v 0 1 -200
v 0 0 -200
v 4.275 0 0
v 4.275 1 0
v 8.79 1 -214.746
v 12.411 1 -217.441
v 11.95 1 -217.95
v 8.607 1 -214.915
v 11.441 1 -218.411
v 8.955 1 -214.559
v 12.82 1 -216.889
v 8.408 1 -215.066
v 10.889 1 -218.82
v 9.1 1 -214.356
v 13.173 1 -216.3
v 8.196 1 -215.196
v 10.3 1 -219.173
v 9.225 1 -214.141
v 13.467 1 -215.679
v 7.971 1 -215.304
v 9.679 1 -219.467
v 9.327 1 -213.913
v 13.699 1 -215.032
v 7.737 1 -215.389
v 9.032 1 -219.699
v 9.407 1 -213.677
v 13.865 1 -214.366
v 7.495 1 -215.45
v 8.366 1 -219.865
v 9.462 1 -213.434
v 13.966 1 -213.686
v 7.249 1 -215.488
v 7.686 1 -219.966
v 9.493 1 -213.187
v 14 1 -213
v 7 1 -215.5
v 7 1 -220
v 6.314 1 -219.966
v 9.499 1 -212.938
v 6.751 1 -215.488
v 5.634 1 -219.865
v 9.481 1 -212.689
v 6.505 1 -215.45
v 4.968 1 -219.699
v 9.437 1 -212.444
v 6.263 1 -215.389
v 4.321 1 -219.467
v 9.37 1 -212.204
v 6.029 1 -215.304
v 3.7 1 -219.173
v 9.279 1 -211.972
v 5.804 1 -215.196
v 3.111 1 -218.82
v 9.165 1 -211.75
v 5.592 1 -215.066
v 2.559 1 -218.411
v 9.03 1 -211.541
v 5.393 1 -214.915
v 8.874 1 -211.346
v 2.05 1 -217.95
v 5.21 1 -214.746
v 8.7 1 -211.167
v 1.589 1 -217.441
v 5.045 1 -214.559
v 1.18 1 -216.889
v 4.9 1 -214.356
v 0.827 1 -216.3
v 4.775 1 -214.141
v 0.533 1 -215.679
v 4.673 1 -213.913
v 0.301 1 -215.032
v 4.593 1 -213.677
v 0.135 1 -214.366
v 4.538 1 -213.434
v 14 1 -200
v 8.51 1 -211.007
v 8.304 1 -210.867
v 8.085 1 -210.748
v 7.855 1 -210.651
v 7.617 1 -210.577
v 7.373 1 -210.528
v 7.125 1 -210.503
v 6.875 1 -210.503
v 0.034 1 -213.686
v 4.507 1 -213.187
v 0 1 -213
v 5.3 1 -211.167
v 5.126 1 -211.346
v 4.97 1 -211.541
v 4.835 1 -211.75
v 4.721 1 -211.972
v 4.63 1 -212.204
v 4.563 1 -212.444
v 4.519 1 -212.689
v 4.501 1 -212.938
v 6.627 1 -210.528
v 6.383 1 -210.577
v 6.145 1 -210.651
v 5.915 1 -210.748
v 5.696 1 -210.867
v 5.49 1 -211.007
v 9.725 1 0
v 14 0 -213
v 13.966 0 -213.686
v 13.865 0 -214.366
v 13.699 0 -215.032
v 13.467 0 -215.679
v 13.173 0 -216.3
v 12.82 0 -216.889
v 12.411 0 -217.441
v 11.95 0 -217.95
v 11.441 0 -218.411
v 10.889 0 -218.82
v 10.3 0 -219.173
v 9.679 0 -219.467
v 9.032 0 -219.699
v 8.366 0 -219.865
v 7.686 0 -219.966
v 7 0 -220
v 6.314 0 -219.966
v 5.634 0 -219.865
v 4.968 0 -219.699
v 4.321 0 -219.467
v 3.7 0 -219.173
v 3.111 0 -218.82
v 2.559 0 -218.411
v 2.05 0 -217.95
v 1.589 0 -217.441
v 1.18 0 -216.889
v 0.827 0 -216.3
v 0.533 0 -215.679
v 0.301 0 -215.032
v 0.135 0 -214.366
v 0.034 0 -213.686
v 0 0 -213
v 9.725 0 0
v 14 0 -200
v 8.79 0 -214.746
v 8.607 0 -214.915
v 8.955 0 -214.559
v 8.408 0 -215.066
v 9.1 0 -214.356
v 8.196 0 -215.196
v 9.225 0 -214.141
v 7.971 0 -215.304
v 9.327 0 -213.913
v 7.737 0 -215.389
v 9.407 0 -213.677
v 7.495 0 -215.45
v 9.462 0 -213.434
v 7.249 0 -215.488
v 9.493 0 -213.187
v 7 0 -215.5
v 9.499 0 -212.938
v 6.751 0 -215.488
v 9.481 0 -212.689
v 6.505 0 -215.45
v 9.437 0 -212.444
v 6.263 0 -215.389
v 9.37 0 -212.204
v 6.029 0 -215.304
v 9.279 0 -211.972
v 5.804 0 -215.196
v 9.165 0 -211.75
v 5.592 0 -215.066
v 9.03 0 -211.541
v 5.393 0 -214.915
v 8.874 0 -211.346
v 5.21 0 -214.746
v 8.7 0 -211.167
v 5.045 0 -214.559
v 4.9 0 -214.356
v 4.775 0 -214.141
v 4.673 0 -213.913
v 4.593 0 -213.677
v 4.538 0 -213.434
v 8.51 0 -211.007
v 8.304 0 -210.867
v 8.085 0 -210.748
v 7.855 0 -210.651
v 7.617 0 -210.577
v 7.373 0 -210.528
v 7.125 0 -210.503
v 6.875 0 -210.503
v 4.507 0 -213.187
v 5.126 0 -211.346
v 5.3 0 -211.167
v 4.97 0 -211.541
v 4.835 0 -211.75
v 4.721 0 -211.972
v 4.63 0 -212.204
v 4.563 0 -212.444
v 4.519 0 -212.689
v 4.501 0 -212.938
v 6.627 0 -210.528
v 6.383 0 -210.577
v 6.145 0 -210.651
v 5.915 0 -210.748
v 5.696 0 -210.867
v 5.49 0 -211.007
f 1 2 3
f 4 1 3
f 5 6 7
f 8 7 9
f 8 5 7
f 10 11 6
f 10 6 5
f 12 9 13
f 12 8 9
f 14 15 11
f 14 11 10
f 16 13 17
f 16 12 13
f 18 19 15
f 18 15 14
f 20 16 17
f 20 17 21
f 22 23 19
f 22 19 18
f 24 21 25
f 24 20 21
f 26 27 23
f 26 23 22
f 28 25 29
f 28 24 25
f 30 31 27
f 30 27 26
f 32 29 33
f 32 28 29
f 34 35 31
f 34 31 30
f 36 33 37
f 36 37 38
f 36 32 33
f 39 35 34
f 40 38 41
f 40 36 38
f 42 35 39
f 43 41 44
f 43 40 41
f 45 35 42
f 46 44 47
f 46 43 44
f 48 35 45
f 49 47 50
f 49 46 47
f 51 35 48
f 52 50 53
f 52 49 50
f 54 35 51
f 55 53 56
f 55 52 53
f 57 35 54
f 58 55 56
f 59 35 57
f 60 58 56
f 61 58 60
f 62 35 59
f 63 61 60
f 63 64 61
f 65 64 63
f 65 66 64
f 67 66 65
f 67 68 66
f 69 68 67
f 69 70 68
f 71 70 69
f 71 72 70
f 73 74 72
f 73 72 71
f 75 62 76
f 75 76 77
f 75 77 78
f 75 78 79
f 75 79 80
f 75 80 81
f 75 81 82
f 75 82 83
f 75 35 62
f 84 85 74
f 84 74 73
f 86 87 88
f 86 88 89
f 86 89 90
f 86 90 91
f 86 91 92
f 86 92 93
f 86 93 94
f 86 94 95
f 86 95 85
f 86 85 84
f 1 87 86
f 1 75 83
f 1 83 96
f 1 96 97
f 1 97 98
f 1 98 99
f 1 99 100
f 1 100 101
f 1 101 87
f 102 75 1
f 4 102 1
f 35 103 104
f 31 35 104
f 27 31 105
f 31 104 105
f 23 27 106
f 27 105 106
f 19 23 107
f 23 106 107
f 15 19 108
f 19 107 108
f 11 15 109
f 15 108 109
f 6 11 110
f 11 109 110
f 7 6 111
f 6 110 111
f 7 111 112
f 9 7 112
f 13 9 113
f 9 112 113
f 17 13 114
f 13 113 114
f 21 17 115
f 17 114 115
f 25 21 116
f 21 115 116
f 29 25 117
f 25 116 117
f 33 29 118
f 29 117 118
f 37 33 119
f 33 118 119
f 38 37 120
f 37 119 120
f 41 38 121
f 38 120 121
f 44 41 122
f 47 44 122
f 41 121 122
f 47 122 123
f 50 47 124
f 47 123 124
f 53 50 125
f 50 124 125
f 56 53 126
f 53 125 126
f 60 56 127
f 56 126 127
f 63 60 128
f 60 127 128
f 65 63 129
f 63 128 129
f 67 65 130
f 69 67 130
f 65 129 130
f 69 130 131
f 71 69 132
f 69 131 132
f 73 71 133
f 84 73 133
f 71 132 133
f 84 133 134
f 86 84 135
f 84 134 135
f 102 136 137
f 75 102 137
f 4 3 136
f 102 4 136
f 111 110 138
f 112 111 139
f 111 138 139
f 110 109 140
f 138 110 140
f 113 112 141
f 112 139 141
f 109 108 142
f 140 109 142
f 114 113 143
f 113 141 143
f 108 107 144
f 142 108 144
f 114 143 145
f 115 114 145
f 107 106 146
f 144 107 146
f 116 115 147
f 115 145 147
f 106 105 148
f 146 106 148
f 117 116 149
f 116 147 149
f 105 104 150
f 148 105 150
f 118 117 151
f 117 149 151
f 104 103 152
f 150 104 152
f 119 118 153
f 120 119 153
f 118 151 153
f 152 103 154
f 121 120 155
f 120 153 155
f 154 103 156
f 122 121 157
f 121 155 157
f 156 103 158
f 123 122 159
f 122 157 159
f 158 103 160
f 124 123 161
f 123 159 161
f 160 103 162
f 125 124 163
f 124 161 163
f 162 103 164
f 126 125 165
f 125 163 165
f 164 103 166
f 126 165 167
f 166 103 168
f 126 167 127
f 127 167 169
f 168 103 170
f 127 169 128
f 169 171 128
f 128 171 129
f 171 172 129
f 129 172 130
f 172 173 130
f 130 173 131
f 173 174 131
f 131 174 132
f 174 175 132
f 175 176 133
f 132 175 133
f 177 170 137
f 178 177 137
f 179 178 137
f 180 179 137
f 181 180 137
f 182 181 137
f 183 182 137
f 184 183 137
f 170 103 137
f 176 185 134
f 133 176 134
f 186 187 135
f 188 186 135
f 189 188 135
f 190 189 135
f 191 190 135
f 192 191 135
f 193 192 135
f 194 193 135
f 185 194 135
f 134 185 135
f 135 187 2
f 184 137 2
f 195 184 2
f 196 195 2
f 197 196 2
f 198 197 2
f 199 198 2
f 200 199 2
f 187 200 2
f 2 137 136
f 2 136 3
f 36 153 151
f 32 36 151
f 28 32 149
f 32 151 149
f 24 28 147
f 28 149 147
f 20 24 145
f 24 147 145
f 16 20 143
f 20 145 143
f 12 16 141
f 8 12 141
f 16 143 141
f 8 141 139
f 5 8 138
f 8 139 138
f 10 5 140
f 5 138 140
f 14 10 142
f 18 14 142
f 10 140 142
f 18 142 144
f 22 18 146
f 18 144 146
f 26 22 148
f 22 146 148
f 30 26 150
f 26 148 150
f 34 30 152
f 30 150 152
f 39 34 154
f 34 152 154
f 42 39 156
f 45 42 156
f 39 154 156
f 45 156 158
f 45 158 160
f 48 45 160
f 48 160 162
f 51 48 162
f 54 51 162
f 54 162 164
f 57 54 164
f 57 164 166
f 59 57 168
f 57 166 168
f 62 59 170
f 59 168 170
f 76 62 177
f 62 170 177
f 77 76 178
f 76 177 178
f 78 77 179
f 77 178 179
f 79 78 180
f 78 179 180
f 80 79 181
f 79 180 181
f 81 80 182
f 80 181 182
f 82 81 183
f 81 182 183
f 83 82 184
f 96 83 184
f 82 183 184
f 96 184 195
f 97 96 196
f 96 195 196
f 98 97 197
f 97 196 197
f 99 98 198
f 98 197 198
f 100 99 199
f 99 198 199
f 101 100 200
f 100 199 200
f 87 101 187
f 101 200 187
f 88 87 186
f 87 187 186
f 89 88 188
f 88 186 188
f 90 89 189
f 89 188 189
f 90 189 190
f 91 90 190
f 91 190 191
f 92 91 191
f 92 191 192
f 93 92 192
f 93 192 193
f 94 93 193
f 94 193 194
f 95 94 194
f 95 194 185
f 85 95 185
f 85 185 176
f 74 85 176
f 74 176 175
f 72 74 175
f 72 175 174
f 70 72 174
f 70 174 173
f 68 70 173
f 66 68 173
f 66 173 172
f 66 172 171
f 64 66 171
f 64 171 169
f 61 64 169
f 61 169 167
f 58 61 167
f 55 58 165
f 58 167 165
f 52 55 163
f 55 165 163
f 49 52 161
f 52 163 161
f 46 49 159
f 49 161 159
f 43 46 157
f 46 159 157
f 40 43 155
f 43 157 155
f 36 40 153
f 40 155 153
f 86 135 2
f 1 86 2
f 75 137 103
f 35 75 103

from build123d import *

# Parameters (mm, degrees)
BOSS_EXTRUDE1_DEPTH = 1
SKETCH2_R           = 2.5
BOSS_EXTRUDE2_DEPTH = 1


with BuildPart() as part:
    # Sketch1 → Boss-Extrude1 (new body)
    with BuildSketch(Plane(origin=(0, 0, 0), x_dir=(1, 0, 0), z_dir=(0, 1, 0))):
        Polygon((9.725, 200), (4.275, 200), (0, 200), (4.275, 0), (9.725, 0), (14, 200), align=None)
    extrude(amount=BOSS_EXTRUDE1_DEPTH)

    # Sketch2 → Boss-Extrude2 (add)
    with BuildSketch(Plane.XZ):
        with BuildLine():
            Line((0, -200), (14, -200))
            Line((14, -200), (14, -213))
            ThreePointArc((14, -213), (7, -220), (0, -213))
            Line((0, -213), (0, -200))
        make_face()
        with Locations(Location((7, -213, 0), (0, 0, 270))):
            Circle(SKETCH2_R, mode=Mode.SUBTRACT)
    extrude(amount=-BOSS_EXTRUDE2_DEPTH)


solid = part.part
